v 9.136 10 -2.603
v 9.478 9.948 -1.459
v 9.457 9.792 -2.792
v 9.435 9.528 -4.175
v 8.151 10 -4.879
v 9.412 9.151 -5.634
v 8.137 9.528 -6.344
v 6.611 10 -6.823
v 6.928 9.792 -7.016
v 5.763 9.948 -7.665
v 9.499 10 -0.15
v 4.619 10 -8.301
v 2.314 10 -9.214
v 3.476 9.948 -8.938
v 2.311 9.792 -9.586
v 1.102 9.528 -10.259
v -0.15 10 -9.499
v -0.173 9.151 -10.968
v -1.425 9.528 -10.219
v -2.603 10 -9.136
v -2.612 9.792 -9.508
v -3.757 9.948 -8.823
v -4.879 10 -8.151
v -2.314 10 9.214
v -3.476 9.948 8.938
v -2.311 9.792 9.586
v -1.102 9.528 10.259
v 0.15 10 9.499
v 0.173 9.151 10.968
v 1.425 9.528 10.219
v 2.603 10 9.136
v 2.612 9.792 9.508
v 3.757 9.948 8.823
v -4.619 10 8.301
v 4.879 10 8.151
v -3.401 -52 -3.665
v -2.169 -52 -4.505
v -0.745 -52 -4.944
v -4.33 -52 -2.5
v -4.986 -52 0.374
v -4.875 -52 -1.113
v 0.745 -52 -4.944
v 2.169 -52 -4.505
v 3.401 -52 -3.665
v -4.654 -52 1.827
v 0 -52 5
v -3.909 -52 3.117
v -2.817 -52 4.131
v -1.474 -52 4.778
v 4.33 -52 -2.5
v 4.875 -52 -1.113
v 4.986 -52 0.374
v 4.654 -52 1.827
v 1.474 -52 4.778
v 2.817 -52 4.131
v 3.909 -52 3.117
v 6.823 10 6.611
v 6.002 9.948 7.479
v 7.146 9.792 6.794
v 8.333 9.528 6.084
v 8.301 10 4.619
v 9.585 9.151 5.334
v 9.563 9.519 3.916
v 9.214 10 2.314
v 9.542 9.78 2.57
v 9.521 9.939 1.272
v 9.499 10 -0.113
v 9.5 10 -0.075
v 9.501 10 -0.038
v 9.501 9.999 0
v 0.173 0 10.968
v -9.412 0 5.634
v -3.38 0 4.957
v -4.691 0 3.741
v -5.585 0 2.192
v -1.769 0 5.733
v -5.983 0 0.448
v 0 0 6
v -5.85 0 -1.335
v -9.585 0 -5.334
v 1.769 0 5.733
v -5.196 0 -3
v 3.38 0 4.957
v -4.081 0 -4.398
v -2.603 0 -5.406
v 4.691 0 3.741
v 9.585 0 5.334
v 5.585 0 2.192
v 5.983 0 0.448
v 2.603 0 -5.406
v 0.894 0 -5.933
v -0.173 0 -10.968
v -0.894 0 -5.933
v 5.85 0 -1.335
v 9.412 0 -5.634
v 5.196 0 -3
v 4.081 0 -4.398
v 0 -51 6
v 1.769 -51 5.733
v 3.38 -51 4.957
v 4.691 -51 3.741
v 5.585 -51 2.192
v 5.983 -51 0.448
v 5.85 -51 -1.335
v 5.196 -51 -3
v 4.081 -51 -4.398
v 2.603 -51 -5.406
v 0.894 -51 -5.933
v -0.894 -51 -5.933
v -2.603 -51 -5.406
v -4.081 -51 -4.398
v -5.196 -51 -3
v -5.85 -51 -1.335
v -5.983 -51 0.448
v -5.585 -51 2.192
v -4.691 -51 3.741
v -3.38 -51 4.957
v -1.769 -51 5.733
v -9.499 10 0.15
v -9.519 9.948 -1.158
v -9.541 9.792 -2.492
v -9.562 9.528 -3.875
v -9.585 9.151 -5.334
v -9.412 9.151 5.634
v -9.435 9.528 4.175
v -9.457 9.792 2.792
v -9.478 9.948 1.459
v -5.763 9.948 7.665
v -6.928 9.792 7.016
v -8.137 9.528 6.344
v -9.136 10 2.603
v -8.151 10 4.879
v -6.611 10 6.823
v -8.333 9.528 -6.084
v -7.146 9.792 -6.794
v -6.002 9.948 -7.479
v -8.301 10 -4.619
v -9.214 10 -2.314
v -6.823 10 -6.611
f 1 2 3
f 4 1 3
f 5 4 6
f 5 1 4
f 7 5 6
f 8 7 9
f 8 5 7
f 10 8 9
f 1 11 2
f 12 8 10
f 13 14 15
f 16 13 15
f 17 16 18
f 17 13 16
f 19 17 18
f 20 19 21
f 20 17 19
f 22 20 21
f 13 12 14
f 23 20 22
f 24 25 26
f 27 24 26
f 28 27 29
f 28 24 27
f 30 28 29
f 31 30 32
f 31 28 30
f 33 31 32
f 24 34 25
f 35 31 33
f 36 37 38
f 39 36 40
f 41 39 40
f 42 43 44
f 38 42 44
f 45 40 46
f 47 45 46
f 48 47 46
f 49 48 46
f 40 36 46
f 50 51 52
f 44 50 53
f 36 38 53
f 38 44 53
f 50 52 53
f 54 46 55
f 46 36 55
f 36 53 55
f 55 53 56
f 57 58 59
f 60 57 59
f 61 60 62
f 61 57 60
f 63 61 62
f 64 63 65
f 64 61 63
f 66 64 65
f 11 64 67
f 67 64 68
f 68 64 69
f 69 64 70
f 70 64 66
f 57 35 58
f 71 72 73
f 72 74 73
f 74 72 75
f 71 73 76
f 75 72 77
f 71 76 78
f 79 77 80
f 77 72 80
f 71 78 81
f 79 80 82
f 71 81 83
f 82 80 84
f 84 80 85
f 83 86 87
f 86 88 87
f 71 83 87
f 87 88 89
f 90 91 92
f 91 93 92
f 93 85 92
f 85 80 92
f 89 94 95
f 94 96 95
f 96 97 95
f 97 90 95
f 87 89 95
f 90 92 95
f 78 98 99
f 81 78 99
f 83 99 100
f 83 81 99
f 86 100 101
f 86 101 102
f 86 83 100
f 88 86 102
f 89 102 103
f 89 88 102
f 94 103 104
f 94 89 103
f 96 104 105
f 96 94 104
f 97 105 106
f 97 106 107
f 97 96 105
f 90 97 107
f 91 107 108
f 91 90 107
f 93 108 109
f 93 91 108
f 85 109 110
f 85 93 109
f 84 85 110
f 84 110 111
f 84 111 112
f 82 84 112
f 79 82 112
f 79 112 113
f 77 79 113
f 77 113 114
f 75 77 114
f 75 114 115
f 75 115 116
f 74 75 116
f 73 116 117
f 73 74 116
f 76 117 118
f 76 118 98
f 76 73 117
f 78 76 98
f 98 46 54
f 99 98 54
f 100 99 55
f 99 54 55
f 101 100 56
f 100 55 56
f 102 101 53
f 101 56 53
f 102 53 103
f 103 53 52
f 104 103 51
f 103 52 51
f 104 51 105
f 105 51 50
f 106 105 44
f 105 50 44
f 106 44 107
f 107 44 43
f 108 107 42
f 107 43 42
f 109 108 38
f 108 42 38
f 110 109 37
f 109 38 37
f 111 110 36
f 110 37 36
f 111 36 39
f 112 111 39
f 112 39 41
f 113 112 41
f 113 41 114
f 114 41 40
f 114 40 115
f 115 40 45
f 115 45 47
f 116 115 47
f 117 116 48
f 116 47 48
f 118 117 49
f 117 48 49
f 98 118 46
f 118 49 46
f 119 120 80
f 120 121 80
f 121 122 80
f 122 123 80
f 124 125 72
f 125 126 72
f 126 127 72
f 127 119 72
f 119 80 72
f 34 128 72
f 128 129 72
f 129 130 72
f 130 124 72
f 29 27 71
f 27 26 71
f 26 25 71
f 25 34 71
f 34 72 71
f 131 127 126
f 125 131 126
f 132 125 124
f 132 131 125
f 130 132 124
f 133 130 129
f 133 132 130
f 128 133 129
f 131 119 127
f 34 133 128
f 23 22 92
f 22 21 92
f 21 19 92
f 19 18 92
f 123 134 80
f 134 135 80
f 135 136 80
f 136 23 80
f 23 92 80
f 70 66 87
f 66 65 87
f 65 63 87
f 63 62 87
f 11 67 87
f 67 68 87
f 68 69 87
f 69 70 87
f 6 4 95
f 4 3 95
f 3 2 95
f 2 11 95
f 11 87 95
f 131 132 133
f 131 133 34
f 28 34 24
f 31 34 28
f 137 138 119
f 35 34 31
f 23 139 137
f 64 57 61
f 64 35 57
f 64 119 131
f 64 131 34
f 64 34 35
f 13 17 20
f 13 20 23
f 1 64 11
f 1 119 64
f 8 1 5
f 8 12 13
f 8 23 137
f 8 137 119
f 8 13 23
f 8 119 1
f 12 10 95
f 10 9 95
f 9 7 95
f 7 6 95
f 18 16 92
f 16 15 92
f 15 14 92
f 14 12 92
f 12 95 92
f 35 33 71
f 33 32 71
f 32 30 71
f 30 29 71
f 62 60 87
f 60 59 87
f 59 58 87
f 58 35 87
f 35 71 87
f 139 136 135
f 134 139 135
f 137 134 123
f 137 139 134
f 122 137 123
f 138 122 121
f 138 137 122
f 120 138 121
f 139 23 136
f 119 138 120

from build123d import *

# Parameters (mm, degrees)
SKETCH2_R           = 6
BOSS_EXTRUDE1_DEPTH = 52
BOSS_EXTRUDE2_DEPTH = 10
SKETCH5_OUTSIDE_W   = 69.512
SKETCH5_OUTSIDE_H   = 72.278
SKETCH5_OUTSIDE_R   = 9.5
CUT_EXTRUDE1_DEPTH  = 10
CUT_EXTRUDE1_DRAFT  = -60
CHAMFER1_SIZE       = 1


with BuildPart() as part:
    # Sketch2 → Boss-Extrude1 (new body)
    with BuildSketch(Plane(origin=(0, 0, 0), x_dir=(1, 0, 0), z_dir=(0, 1, 0))):
        Circle(SKETCH2_R)
    extrude(amount=-BOSS_EXTRUDE1_DEPTH)

    # Sketch3 → Boss-Extrude2 (add)
    with BuildSketch(Plane(origin=(0, 0, 0), x_dir=(1, 0, 0), z_dir=(0, 1, 0))):
        Polygon((9.585446106, -5.334093763), (9.412183758, 5.634192953), (-0.173262348, 10.968286716), (-9.585446106, 5.334093763), (-9.412183758, -5.634192953), (0.173262348, -10.968286716), align=None)
    extrude(amount=BOSS_EXTRUDE2_DEPTH)


with BuildPart() as cut_extrude1_tool:
    # Sketch5 outside → Cut-Extrude1 (with draft: the straight prism first)
    with BuildSketch(Plane(origin=(0, 10, 0), x_dir=(1, 0, 0), z_dir=(0, 1, 0))):
        Rectangle(SKETCH5_OUTSIDE_W, SKETCH5_OUTSIDE_H)
        Circle(SKETCH5_OUTSIDE_R, mode=Mode.SUBTRACT)
    extrude(amount=-CUT_EXTRUDE1_DEPTH)
    # Cut-Extrude1: the draft: its side faces are tilted about the plane it starts from
    cut_extrude1_sides = [cut_extrude1_tool.faces().sort_by_distance(p)[0] for p in [
        (0, 5, 36.139),
        (34.756, 5, 0),
        (0, 5, -36.139),
        (-34.756, 5, 0),
        (-9.5, 5, 0),
    ]]
    draft(cut_extrude1_sides, Plane(origin=(0, 10, 0), x_dir=(1, 0, 0), z_dir=(0, 1, 0)), CUT_EXTRUDE1_DRAFT)


with BuildPart() as part_1:
    add(part.part)

    # Cut-Extrude1: cut by cut_extrude1_tool
    add(cut_extrude1_tool.part, mode=Mode.SUBTRACT)

    # Chamfer1
    chamfer1_edges = [part_1.edges().sort_by_distance(p)[0] for p in [
        (-6, -52, 0),
    ]]
    chamfer(chamfer1_edges, length=CHAMFER1_SIZE)


solid = part_1.part
